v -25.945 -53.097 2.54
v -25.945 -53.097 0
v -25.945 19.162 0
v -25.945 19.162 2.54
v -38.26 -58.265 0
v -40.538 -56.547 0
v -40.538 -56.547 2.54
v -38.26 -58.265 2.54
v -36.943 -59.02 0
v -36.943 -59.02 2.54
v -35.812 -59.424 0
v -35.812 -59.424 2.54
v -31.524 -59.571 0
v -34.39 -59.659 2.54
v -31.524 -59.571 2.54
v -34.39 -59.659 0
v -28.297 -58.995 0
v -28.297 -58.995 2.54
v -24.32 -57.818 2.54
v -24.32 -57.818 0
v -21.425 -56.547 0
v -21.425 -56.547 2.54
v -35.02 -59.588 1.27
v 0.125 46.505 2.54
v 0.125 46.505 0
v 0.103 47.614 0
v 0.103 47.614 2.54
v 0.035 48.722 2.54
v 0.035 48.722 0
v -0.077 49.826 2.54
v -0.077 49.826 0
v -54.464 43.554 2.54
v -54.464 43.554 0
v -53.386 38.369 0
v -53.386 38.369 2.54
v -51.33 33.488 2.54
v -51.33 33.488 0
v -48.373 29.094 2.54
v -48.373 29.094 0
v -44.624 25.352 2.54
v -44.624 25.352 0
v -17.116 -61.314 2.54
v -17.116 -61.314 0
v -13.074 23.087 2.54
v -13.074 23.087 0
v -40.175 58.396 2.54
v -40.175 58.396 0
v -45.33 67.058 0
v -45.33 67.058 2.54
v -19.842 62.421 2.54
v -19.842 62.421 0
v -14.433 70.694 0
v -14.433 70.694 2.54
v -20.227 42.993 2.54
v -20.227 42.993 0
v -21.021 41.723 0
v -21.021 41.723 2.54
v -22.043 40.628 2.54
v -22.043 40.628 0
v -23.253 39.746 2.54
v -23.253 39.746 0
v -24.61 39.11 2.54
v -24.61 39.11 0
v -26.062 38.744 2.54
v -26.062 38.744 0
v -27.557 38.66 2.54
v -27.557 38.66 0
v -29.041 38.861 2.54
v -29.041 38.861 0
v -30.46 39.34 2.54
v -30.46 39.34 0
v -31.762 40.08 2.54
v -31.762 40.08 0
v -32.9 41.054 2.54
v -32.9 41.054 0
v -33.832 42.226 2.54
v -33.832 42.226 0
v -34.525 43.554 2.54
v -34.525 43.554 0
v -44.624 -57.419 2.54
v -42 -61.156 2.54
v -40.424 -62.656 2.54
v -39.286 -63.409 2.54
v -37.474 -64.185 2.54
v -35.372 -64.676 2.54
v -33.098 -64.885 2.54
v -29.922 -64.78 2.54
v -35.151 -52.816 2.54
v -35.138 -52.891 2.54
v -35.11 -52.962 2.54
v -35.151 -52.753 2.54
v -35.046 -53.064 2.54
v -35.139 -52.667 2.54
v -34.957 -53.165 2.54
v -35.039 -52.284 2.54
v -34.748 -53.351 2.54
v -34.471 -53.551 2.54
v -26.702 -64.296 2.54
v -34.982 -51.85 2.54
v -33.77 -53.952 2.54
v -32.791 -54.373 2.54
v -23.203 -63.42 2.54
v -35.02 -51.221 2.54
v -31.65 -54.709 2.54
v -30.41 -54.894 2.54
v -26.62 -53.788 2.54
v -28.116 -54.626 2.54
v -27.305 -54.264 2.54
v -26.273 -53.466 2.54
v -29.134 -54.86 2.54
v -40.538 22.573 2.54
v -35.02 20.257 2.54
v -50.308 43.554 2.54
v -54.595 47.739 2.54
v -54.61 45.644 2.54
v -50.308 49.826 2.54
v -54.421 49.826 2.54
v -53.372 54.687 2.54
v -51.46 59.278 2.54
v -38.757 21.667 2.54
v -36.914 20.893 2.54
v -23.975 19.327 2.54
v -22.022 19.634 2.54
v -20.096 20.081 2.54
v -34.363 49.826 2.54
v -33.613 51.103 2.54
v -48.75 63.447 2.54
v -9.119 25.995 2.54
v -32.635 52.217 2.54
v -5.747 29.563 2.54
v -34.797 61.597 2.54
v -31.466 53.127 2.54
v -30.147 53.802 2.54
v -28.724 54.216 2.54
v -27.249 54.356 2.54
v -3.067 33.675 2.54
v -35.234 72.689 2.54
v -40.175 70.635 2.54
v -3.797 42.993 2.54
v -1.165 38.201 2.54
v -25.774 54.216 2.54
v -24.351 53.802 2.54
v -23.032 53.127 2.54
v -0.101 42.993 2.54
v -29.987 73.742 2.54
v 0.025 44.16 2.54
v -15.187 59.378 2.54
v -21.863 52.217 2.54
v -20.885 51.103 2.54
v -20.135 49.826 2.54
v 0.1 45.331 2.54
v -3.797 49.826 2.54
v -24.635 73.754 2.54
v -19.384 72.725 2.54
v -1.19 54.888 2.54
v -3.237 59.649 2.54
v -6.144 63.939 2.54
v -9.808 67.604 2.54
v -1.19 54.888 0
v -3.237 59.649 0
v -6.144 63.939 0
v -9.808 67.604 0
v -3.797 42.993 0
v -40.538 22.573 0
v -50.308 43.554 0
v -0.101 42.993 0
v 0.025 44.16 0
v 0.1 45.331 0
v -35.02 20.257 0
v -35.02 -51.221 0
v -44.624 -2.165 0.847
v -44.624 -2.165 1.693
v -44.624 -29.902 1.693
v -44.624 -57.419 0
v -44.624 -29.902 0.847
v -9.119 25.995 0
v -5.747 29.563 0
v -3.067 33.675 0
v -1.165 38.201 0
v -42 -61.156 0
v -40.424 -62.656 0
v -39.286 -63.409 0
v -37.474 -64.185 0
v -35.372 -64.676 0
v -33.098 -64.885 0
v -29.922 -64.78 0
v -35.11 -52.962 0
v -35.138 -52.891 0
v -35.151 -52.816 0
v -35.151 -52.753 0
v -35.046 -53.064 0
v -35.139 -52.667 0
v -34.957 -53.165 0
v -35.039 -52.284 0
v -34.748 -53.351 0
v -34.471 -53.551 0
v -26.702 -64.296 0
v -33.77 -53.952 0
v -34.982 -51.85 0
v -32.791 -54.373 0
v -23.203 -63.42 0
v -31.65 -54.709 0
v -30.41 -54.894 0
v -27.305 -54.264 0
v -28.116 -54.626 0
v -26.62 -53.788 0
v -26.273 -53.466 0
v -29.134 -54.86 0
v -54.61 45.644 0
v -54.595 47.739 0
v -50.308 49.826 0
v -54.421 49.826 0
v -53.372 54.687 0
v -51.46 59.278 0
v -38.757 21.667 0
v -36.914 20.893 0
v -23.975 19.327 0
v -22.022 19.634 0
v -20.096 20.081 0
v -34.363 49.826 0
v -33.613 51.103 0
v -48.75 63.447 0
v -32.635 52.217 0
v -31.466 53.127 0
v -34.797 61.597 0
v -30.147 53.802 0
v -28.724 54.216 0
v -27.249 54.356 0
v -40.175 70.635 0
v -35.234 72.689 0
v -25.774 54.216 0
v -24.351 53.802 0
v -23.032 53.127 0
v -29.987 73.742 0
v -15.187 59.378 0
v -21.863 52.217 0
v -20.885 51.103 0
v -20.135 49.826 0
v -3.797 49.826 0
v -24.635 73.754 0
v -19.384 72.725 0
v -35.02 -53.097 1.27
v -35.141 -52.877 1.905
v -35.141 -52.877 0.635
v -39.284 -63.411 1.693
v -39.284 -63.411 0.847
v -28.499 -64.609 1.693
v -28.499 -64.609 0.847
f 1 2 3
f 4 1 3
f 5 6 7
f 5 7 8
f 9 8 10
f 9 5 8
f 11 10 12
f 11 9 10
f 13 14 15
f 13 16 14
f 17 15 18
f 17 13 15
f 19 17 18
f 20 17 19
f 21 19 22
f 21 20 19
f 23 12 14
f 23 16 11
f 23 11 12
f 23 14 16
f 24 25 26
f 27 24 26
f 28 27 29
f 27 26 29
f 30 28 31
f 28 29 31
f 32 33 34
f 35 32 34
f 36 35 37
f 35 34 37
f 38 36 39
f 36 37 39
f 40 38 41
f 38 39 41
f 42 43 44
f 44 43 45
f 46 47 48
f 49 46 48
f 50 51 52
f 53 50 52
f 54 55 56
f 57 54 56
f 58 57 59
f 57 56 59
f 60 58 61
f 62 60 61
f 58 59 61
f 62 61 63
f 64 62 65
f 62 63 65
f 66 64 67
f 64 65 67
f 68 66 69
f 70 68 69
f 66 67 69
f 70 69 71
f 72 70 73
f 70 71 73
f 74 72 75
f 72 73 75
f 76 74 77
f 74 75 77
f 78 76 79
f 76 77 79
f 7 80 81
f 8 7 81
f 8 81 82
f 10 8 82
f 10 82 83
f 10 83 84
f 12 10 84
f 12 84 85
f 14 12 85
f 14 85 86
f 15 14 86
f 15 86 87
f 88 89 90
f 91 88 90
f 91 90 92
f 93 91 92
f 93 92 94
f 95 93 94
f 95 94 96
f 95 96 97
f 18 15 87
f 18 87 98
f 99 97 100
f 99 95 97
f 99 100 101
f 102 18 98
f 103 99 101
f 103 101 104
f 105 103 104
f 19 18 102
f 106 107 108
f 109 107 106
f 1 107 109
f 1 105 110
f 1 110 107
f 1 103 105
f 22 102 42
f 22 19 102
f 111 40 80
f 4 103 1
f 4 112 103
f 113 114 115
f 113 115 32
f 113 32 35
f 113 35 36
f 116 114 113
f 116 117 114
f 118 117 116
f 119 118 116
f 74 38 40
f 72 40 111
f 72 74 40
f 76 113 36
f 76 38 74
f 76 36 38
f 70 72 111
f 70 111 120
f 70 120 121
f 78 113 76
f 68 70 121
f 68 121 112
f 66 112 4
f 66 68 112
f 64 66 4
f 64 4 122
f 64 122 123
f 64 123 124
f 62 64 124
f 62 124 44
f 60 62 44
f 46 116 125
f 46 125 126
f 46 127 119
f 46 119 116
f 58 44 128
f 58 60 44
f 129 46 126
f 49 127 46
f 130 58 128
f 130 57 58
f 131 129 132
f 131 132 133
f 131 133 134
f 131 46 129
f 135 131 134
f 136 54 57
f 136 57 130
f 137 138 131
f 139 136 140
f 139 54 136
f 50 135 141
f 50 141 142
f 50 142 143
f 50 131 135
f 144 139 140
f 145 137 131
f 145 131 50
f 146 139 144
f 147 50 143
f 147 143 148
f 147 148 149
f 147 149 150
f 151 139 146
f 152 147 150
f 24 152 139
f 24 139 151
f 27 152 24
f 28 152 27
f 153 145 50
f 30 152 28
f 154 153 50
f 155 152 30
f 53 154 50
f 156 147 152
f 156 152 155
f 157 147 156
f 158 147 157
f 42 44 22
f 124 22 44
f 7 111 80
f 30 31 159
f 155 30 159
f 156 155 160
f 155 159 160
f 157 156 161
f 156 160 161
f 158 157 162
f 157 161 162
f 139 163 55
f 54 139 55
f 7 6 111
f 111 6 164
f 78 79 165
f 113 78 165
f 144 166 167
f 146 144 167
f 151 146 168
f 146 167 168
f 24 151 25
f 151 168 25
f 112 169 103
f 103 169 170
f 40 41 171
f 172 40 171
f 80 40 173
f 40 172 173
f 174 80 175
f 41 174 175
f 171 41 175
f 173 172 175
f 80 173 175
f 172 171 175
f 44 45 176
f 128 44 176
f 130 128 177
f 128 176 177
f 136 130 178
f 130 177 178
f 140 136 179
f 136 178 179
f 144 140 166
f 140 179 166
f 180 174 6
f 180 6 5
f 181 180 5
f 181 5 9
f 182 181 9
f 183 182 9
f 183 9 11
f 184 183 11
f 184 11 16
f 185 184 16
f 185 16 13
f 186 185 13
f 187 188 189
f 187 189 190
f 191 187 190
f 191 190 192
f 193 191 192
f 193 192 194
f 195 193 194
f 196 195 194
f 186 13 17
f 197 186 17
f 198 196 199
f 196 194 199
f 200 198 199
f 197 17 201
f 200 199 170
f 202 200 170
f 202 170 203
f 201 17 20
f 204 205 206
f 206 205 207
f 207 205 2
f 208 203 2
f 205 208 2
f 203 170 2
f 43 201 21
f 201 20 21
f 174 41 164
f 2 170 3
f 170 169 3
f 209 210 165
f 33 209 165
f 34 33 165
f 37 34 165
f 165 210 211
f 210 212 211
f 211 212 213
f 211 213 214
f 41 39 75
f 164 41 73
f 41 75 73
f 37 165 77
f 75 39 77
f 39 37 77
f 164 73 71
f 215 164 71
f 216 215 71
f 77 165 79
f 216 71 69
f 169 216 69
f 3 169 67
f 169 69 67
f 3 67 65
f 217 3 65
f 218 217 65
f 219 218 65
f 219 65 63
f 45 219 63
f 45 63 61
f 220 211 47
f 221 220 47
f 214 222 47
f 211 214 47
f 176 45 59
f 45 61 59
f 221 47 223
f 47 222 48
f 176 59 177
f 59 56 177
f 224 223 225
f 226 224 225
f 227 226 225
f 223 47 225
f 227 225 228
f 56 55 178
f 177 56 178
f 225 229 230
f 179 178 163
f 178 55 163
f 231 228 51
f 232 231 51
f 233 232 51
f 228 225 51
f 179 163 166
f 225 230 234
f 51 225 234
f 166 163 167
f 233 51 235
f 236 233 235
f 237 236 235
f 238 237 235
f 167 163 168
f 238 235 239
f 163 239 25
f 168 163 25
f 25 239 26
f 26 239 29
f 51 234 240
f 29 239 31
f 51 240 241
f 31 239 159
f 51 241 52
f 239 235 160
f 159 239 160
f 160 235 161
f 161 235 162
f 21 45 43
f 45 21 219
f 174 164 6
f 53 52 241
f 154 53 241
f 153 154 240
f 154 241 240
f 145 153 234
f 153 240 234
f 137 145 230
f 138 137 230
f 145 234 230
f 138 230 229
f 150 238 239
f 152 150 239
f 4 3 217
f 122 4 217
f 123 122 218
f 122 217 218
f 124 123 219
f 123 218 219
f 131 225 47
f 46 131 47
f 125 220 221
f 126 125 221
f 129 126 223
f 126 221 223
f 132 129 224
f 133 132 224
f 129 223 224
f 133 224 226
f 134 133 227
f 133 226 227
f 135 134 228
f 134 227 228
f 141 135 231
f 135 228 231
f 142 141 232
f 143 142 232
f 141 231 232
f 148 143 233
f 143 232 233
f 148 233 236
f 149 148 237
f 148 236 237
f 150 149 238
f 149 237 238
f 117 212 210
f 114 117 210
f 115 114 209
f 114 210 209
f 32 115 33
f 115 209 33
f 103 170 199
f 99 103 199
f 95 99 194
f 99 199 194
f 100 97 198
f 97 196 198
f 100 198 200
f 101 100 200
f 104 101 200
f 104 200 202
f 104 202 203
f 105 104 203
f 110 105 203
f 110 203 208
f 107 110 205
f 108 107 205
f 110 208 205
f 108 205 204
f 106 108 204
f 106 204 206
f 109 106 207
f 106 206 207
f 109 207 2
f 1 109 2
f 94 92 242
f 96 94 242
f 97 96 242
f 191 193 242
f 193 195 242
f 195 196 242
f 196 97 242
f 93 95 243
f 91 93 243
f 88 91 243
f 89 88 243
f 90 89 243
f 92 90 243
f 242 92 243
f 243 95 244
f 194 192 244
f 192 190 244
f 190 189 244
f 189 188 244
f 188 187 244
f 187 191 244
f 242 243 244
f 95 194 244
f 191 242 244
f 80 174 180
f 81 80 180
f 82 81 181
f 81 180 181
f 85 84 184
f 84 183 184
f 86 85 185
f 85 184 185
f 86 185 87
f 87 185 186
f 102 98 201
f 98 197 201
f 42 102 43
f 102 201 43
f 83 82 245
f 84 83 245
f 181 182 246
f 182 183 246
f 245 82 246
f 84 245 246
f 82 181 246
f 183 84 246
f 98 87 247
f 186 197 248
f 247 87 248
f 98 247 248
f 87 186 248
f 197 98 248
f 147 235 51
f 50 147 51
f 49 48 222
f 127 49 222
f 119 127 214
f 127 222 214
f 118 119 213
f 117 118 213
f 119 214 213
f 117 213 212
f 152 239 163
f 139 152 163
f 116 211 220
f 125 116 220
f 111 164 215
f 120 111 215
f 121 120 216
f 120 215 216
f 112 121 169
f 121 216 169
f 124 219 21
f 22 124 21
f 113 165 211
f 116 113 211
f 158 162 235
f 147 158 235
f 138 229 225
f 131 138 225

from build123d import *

# Parameters (mm, degrees)
F1_DEPTH = 2.54


with BuildPart() as f1:
    # F0 (on Top) → F1 (new body)
    with BuildSketch(Plane.XY):
        with BuildLine():
            Line((-17.1159264309, -61.3138160406), (-13.0736523365, 23.0865568339))
            ThreePointArc((-13.0736523365, 23.0865568339), (-16.4796766981, 21.3378348074), (-20.0963728567, 20.0814353591))
            Line((-20.0963728567, 20.0814353591), (-21.4248895645, -56.5471537411))
            add(Edge.make_bspline(
                [(-40.5384023351, -56.5471537411), (-39.0896691197, -57.4965649401), (-35.7119585286, -61.6788600498), (-23.9624212357, -57.9964701236), (-21.4248895645, -56.5471537411)],
                knots=[0, 0, 0, 0, 0.4021142555, 1, 1, 1, 1], degree=3))
            Line((-40.5384023351, -56.5471537411), (-40.5384023351, 22.5727239757))
            ThreePointArc((-40.5384023351, 22.5727239757), (-42.6442434651, 23.8699001593), (-44.6244072494, 25.3518530274))
            add(Edge.make_bspline(
                [(-44.6244072494, 25.3518530274), (-44.6244072494, -1.9093834032), (-44.6244072494, -30.1582468137), (-44.6244072494, -57.4194832443)],
                knots=[0, 0, 0, 0, 82.7713362717, 82.7713362717, 82.7713362717, 82.7713362717], degree=3))
            add(Edge.make_bspline(
                [(-44.6244072494, -57.4194832443), (-43.2058624137, -59.7061717245), (-39.9582329042, -64.8059149321), (-28.1728136888, -65.3818875584), (-20.4774261937, -62.5923179822), (-17.1159264309, -61.3138160406)],
                knots=[0, 0, 0, 0, 0.2960473312, 0.6402667795, 1, 1, 1, 1], degree=3))
        make_face()
        with BuildLine():
            Line((-50.3076799214, 43.5544437304), (-50.3076799214, 49.825878452))
            Line((-50.3076799214, 49.825878452), (-54.4210394787, 49.825878452))
            ThreePointArc((-54.4210394787, 49.825878452), (-54.6226132256, 46.691389625), (-54.4637968628, 43.5544437304))
            Line((-54.4637968628, 43.5544437304), (-50.3076799214, 43.5544437304))
        make_face()
        with BuildLine():
            ThreePointArc((-0.1008648303, 42.9929857768), (0.068721218, 44.7452351768), (0.125327938, 46.5047615525))
            ThreePointArc((0.125327938, 46.5047615525), (0.0747286896, 48.1683950998), (-0.076881998, 49.825878452))
            Line((-0.076881998, 49.825878452), (-3.7968070246, 49.825878452))
            Line((-3.7968070246, 49.825878452), (-3.7968070246, 42.9929857768))
            Line((-3.7968070246, 42.9929857768), (-0.1008648303, 42.9929857768))
        make_face()
        with BuildLine():
            Line((-3.7968070246, 49.825878452), (-0.076881998, 49.825878452))
            ThreePointArc((-0.076881998, 49.825878452), (-3.236730066, 59.6487510029), (-9.8084146157, 67.6040276885))
            Line((-9.8084146157, 67.6040276885), (-15.1872234419, 59.3776144087))
            Line((-15.1872234419, 59.3776144087), (-19.8417848233, 62.4209815468))
            Line((-19.8417848233, 62.4209815468), (-14.4327960403, 70.6935524063))
            ThreePointArc((-14.4327960403, 70.6935524063), (-27.3113565295, 73.8789791176), (-40.1752617833, 70.6348759706))
            Line((-40.1752617833, 70.6348759706), (-34.7966371696, 61.5968285634))
            Line((-34.7966371696, 61.5968285634), (-40.1752617833, 58.3959598988))
            Line((-40.1752617833, 58.3959598988), (-45.3300042556, 67.0578038056))
            ThreePointArc((-45.3300042556, 67.0578038056), (-51.4604472967, 59.2779991675), (-54.4210394787, 49.825878452))
            Line((-54.4210394787, 49.825878452), (-50.3076799214, 49.825878452))
            Line((-50.3076799214, 49.825878452), (-34.3632135618, 49.825878452))
            ThreePointArc((-34.3632135618, 49.825878452), (-27.2489607383, 54.3560296473), (-20.1347079149, 49.825878452))
            Line((-20.1347079149, 49.825878452), (-3.7968070246, 49.825878452))
        make_face()
        with BuildLine():
            ThreePointArc((-13.0736523365, 23.0865568339), (-4.3148722617, 31.55888365), (-0.1008648303, 42.9929857768))
            Line((-0.1008648303, 42.9929857768), (-3.7968070246, 42.9929857768))
            Line((-3.7968070246, 42.9929857768), (-20.2268640716, 42.9929857768))
            ThreePointArc((-20.2268640716, 42.9929857768), (-27.5570302355, 38.6595398297), (-34.5248136398, 43.5544437304))
            Line((-34.5248136398, 43.5544437304), (-50.3076799214, 43.5544437304))
            Line((-50.3076799214, 43.5544437304), (-54.4637968628, 43.5544437304))
            ThreePointArc((-54.4637968628, 43.5544437304), (-51.3302170065, 33.4876659826), (-44.6244072494, 25.3518530274))
            ThreePointArc((-44.6244072494, 25.3518530274), (-42.6442434651, 23.8699001593), (-40.5384023351, 22.5727239757))
            ThreePointArc((-40.5384023351, 22.5727239757), (-37.8424582665, 21.2633374514), (-35.0195281208, 20.2565242196))
            ThreePointArc((-35.0195281208, 20.2565242196), (-30.5282095898, 19.3275982071), (-25.944840163, 19.1615548997))
            ThreePointArc((-25.944840163, 19.1615548997), (-22.9956650166, 19.4629207122), (-20.0963728567, 20.0814353591))
            ThreePointArc((-20.0963728567, 20.0814353591), (-16.4796766981, 21.3378348074), (-13.0736523365, 23.0865568339))
        make_face()
        with BuildLine():
            Line((-25.944840163, -53.0968643725), (-25.944840163, 19.1615548997))
            ThreePointArc((-25.944840163, 19.1615548997), (-30.5282095898, 19.3275982071), (-35.0195281208, 20.2565242196))
            Line((-35.0195281208, 20.2565242196), (-35.0195281208, -51.2205958366))
            add(Edge.make_bspline(
                [(-35.0195281208, -51.2205958366), (-34.829377456, -52.5195475688), (-36.644732065, -52.9287098402), (-28.7908467818, -56.628709604), (-25.944840163, -53.0968643725)],
                knots=[0, 0, 0, 0, 0.3125763508, 1, 1, 1, 1], degree=3))
        make_face()
    extrude(amount=F1_DEPTH)


solid = f1.part
